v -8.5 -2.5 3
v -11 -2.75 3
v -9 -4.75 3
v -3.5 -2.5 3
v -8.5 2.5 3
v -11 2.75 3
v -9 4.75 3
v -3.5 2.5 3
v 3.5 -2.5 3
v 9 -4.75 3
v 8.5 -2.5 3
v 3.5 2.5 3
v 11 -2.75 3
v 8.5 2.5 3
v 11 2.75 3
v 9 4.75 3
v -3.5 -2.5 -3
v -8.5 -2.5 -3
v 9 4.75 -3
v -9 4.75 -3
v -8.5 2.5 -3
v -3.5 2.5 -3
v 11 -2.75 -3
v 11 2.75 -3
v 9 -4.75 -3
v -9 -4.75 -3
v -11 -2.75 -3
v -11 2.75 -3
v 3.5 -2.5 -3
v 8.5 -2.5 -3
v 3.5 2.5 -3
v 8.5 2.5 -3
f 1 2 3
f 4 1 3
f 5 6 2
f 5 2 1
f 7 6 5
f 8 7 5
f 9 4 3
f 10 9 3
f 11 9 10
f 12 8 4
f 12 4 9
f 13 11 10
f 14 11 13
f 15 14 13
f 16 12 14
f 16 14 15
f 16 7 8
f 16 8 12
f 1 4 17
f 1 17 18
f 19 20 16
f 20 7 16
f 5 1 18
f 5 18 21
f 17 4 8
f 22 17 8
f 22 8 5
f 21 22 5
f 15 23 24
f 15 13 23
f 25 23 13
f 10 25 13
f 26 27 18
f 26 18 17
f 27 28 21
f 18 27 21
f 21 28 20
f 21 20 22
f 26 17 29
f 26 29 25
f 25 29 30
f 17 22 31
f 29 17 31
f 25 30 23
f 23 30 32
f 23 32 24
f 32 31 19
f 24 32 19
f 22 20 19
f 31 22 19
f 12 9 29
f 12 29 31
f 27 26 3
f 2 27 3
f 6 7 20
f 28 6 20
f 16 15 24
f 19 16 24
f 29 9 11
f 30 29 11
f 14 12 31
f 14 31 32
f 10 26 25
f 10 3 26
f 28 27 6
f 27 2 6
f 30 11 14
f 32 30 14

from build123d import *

# Parameters (mm, degrees)
SKETCH_1_W          = 22
SKETCH_1_H          = 9.5
EXTRUDE_1_DEPTH     = 3
SKETCH_2_W          = 5
SKETCH_2_H          = 5
CUT_EXTRUDE_1_DEPTH = 14.400093283
CHAMFER_1_SIZE      = 2


with BuildPart() as part:
    # 草图1 → 凸台-拉伸1 (new, symmetric)
    with BuildSketch(Plane.XY):
        Rectangle(SKETCH_1_W, SKETCH_1_H)
    extrude(amount=EXTRUDE_1_DEPTH, both=True)

    # 草图2 → 切除-拉伸1 (cut, through all)
    with BuildSketch(Plane.XY.offset(3)):
        with Locations((6, 0)):
            Rectangle(SKETCH_2_W, SKETCH_2_H)
    cut_extrude_1 = extrude(amount=-CUT_EXTRUDE_1_DEPTH, mode=Mode.SUBTRACT)

    # 镜向1: 切除-拉伸1 across plane
    add(cut_extrude_1.mirror(Plane(origin=(0, 0, 0), x_dir=(0, 0, 1), z_dir=(1, 0, 0))), mode=Mode.SUBTRACT)

    # 倒角1
    chamfer_1_edges = [part.edges().sort_by_distance(p)[0] for p in [
        (11, -4.75, 0),
        (-11, -4.75, 0),
        (-11, 4.75, 0),
        (11, 4.75, 0),
    ]]
    chamfer(chamfer_1_edges, length=CHAMFER_1_SIZE)


solid = part.part
